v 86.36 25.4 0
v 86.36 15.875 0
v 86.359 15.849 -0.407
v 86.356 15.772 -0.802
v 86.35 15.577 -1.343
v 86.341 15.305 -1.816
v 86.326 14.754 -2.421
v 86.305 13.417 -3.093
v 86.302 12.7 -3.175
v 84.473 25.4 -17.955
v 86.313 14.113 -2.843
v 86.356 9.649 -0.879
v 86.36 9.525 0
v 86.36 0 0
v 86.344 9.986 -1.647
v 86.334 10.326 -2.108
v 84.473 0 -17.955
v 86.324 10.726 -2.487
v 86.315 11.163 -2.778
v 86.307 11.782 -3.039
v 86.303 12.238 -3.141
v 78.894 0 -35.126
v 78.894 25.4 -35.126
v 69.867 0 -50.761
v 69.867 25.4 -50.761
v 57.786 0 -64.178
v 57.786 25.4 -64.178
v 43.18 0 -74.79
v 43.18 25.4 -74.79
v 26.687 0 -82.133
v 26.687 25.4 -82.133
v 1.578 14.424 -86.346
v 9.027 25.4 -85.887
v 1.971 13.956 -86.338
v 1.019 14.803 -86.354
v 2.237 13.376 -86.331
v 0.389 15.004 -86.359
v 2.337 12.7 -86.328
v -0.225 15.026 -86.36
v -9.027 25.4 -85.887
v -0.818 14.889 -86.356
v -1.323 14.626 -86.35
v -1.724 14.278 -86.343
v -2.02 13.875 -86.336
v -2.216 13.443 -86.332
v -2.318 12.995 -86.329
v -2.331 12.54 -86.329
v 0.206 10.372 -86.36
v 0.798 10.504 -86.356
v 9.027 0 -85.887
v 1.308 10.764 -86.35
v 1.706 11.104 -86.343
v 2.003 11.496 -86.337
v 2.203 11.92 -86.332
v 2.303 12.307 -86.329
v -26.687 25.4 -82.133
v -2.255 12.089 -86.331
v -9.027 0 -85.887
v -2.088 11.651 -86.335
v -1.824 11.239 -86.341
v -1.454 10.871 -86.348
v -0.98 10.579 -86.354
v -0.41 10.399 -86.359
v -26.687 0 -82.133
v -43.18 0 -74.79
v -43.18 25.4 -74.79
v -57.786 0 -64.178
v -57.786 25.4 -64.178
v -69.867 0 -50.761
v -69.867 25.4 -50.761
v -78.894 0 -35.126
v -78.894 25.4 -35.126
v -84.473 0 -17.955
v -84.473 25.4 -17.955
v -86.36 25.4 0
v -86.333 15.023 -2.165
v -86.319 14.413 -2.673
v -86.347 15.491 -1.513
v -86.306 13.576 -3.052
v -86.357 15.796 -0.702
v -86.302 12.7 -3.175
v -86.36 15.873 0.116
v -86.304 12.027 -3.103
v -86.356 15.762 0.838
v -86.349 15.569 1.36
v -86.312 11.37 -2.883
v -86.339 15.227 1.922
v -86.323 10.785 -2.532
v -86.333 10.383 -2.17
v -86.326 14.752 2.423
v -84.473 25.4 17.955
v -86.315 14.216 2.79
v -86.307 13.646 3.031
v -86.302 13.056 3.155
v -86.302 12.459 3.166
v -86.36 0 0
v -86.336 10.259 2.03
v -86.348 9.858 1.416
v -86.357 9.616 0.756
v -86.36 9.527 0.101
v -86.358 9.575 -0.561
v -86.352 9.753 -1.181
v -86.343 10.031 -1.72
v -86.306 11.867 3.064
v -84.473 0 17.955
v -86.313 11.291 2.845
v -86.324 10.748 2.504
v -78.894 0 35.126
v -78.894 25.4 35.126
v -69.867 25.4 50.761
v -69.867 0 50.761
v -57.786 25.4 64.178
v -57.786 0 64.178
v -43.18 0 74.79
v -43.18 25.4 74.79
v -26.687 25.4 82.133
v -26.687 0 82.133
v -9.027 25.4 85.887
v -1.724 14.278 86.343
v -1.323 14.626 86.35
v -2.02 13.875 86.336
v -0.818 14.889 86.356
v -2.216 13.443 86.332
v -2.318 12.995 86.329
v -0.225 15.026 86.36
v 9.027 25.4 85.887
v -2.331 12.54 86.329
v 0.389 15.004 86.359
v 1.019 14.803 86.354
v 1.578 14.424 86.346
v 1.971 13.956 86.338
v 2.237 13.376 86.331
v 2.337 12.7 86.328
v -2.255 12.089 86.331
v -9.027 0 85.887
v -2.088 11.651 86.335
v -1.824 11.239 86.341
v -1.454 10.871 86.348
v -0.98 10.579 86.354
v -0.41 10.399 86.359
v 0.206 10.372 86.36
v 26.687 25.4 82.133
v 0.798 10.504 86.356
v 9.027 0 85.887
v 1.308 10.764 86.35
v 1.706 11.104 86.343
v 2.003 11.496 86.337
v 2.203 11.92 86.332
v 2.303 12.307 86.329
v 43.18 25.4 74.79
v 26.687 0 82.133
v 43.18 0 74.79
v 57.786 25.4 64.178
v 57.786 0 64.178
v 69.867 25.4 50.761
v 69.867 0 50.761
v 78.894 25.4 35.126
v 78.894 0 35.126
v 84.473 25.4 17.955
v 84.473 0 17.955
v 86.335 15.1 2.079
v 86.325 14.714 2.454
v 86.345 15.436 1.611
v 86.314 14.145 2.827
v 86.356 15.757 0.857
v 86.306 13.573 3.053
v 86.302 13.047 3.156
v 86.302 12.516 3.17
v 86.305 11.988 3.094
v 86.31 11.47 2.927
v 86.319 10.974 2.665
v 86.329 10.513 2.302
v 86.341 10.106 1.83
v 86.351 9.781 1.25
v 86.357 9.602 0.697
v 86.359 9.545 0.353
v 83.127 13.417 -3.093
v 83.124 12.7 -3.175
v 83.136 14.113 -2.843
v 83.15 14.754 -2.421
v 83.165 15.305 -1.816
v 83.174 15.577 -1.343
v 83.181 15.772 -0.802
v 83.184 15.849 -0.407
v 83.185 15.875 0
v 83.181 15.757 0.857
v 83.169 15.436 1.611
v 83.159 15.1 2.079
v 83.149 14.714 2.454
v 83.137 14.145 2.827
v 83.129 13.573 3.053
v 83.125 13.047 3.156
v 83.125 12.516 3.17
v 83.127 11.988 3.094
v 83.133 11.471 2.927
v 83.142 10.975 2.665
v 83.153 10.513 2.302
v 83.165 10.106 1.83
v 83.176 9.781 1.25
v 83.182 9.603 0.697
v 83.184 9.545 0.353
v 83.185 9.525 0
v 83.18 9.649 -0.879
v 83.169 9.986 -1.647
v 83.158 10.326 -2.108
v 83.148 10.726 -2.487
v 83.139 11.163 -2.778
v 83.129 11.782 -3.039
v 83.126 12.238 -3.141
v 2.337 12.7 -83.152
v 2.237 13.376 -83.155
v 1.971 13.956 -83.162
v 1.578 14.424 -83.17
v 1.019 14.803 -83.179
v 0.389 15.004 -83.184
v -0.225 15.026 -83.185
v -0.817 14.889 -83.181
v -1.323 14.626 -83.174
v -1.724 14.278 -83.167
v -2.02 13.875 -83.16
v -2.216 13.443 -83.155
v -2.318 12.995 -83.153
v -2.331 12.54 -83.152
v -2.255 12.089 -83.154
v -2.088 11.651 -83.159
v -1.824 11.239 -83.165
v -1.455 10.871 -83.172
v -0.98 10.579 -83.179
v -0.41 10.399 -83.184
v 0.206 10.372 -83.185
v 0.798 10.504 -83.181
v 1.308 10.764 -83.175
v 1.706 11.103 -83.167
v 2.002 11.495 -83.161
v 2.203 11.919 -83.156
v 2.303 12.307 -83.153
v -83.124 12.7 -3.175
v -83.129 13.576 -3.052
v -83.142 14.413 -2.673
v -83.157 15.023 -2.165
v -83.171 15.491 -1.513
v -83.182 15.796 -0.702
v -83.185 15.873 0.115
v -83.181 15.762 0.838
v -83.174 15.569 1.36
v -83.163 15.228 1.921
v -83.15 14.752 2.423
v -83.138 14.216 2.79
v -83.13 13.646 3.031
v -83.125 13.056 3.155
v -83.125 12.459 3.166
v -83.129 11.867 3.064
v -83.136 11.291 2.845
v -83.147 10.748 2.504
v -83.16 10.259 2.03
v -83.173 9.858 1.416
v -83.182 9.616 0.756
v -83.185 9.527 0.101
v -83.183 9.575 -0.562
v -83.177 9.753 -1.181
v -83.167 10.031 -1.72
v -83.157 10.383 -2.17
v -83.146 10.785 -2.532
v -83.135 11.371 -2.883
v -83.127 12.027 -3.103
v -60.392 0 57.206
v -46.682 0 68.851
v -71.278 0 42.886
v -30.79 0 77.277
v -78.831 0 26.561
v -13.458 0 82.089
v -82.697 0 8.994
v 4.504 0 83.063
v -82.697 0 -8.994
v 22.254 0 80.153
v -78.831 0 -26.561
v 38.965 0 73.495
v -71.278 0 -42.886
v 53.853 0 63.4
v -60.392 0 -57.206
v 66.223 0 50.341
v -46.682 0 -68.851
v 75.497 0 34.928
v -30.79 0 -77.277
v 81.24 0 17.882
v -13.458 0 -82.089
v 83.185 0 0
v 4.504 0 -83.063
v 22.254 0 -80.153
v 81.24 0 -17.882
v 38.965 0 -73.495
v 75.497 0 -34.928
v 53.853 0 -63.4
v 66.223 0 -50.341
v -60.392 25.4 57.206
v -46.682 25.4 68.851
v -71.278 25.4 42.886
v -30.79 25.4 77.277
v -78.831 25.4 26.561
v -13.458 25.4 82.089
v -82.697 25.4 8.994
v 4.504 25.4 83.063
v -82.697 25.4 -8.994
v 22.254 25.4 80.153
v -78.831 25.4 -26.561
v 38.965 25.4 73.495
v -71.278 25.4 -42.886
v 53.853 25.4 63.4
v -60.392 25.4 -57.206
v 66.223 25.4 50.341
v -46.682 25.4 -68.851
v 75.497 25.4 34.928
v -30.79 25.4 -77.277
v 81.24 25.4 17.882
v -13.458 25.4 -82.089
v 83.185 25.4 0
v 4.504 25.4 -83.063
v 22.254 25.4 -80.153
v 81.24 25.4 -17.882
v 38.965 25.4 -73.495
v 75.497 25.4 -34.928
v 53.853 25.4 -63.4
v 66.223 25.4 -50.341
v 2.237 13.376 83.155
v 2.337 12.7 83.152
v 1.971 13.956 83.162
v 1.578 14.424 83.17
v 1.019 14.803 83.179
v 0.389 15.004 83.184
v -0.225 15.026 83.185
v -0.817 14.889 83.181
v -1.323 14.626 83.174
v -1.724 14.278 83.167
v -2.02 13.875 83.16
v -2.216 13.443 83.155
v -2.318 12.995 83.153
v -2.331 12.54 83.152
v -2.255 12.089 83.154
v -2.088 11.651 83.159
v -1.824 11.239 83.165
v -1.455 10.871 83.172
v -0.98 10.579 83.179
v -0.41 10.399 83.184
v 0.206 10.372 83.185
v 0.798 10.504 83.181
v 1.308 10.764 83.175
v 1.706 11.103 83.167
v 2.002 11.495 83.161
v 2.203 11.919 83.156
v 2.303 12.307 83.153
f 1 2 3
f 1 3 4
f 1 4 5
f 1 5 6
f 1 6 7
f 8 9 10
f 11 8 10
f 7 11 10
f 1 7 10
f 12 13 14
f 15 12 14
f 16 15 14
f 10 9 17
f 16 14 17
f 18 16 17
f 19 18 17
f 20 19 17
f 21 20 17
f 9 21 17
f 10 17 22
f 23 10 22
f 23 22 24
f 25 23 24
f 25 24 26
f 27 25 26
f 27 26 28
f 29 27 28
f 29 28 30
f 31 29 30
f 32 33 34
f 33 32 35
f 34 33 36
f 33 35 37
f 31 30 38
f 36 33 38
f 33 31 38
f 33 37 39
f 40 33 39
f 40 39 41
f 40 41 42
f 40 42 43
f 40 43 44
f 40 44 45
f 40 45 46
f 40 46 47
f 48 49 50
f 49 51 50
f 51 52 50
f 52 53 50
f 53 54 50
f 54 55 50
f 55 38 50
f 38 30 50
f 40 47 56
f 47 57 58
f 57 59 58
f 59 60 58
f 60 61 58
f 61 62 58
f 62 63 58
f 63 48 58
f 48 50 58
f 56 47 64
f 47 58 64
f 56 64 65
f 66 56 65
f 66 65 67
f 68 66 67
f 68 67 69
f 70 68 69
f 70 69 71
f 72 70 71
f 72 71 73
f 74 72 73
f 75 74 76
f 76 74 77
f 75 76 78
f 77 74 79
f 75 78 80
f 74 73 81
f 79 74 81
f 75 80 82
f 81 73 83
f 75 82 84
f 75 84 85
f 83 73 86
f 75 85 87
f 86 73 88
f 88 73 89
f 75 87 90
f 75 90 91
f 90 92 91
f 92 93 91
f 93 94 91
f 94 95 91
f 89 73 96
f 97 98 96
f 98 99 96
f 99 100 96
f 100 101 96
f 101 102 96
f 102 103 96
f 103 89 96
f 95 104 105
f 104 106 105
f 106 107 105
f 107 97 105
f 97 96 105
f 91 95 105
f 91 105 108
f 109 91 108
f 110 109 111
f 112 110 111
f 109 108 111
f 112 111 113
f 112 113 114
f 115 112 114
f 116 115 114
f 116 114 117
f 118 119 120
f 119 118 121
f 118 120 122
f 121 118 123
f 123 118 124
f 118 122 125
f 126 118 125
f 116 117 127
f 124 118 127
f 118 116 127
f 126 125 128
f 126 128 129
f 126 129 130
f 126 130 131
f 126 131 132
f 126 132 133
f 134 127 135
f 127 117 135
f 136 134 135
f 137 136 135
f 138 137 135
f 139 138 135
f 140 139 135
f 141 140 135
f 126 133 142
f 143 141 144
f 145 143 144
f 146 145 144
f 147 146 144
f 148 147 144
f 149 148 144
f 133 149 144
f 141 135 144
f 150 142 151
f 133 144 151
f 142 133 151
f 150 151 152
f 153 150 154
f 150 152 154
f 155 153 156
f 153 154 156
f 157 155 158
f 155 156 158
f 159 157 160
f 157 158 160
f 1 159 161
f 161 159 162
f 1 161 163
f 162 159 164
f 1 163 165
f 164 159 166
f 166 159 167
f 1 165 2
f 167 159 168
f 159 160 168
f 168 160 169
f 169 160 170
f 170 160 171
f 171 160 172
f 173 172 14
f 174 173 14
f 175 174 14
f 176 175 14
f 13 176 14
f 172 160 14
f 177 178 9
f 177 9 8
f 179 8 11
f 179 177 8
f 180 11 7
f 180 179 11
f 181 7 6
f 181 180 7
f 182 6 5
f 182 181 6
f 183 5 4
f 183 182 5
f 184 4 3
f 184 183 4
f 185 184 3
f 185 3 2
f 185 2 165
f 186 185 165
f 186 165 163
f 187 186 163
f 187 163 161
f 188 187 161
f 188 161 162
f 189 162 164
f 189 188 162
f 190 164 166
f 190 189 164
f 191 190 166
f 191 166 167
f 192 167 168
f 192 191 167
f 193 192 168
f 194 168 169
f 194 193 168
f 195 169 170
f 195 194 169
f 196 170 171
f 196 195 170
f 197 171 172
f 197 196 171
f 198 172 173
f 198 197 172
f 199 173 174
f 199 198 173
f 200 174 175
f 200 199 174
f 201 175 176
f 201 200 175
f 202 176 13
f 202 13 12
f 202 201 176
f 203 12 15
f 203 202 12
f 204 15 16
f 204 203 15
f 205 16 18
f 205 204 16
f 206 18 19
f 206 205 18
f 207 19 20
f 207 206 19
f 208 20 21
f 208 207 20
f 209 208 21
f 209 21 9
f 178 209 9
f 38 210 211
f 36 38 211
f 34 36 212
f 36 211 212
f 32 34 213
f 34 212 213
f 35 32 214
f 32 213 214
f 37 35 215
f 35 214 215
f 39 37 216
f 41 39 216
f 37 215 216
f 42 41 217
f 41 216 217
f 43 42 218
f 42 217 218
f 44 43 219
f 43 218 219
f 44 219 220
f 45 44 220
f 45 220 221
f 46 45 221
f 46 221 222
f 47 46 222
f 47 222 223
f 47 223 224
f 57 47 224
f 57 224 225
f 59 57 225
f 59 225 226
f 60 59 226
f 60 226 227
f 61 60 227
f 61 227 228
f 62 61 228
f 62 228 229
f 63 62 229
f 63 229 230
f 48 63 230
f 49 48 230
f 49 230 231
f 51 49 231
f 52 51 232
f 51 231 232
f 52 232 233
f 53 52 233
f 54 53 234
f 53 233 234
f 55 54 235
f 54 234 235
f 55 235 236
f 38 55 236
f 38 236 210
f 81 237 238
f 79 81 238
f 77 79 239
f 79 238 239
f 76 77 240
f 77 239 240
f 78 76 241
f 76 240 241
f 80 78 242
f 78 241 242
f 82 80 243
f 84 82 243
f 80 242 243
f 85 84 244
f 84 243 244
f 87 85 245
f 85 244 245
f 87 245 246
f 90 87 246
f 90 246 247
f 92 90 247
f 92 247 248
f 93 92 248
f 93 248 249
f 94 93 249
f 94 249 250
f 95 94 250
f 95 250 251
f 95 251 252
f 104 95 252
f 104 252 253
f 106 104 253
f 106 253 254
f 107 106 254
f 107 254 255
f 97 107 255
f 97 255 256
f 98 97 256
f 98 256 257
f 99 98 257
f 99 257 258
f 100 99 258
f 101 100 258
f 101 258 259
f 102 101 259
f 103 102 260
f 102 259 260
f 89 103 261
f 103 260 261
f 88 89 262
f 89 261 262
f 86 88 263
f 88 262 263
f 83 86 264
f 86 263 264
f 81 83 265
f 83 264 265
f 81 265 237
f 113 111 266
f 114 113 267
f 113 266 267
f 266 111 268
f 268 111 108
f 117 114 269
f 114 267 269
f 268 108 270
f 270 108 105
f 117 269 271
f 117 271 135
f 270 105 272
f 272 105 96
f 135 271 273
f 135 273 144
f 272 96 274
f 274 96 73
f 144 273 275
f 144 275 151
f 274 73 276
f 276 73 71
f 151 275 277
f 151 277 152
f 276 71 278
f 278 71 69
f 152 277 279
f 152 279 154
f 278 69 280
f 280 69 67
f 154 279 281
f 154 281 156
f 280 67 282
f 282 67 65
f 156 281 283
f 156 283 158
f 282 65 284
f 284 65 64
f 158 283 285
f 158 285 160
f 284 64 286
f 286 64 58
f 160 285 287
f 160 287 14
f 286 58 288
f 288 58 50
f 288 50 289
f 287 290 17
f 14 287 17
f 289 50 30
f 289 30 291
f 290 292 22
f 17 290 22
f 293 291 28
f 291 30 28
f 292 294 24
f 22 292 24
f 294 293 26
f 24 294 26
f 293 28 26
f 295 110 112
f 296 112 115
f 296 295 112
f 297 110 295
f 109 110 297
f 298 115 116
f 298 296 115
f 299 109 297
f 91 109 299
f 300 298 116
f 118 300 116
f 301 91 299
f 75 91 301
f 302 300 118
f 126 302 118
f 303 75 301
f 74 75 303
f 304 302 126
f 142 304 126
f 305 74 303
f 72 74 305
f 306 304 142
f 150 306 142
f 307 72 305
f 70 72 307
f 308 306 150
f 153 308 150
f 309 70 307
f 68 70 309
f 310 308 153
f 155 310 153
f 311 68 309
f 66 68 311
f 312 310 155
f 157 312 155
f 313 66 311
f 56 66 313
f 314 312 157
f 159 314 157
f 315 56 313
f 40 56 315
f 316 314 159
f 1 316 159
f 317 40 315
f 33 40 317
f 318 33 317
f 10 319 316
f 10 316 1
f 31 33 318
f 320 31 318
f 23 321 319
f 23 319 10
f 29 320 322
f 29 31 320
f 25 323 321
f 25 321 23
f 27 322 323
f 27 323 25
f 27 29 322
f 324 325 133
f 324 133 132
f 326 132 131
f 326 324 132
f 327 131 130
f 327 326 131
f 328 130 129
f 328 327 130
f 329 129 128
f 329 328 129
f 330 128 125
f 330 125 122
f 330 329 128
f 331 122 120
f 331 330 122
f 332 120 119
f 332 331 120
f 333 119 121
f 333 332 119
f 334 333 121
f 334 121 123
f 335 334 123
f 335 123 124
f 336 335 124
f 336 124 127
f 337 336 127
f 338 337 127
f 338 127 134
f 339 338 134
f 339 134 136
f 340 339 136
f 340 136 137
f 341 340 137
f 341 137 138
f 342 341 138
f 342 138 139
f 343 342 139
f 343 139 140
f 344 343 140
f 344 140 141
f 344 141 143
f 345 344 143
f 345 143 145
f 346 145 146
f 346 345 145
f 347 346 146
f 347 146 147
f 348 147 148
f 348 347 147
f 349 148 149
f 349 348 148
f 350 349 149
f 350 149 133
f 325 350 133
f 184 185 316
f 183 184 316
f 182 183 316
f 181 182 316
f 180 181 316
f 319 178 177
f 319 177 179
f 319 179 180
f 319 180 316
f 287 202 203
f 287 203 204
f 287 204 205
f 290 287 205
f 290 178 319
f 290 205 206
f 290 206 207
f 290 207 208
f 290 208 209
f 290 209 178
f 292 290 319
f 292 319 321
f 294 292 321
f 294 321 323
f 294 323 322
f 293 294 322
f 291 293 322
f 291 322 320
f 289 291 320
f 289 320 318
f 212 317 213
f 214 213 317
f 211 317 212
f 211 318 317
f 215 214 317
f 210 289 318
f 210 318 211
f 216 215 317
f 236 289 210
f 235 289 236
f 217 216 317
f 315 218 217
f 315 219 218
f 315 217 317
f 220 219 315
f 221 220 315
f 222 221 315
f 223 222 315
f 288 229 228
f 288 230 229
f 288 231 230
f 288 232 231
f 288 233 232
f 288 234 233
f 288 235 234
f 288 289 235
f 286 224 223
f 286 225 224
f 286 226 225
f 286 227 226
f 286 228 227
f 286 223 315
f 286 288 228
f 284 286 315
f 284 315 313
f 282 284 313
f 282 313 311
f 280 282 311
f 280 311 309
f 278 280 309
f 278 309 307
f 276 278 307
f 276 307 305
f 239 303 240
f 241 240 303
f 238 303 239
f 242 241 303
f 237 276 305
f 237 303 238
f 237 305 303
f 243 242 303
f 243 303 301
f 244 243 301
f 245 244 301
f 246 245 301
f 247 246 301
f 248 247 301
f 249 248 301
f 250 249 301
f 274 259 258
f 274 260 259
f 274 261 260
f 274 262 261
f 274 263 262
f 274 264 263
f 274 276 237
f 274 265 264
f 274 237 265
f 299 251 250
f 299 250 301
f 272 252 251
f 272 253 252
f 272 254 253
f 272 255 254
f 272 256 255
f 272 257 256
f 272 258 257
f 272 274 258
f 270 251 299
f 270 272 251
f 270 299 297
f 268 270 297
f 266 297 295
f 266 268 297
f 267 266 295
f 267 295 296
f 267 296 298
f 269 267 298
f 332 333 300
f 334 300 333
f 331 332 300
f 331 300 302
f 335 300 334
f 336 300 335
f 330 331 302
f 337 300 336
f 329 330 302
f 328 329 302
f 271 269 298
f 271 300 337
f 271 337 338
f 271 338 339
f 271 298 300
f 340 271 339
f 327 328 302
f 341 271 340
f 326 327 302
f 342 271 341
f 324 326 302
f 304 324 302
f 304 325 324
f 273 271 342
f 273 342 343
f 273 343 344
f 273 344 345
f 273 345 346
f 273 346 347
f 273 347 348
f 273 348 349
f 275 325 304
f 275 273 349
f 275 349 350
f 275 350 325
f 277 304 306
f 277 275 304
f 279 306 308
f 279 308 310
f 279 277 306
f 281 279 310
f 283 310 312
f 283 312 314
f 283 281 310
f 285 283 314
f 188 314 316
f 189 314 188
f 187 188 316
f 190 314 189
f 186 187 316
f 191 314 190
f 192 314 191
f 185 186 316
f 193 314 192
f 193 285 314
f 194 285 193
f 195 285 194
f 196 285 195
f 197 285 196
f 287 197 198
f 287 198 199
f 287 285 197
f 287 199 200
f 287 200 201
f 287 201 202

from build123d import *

# Parameters (mm, degrees)
SKETCH1_R               = 86.36
SKETCH1_R_2             = 83.185
BOSS_EXTRUDE1_DEPTH     = 25.4
SKETCH2_R               = 3.175
CUT_EXTRUDE1_DEPTH      = 87.36
CUT_EXTRUDE1_DEPTH_BACK = 87.36
SKETCH3_R               = 2.3368
CUT_EXTRUDE2_DEPTH      = 87.3600001
CUT_EXTRUDE2_DEPTH_BACK = 87.3600001


with BuildPart() as part:
    # Sketch1 → Boss-Extrude1 (new body)
    with BuildSketch(Plane(origin=(0, 0, 0), x_dir=(1, 0, 0), z_dir=(0, 1, 0))):
        Circle(SKETCH1_R)
        Circle(SKETCH1_R_2, mode=Mode.SUBTRACT)
    extrude(amount=BOSS_EXTRUDE1_DEPTH)

    # Sketch2 → Cut-Extrude1 (cut, two sides)
    with BuildSketch(Plane(origin=(0, 0, 0), x_dir=(0, 0, -1), z_dir=(1, 0, 0))) as cut_extrude1_sk:
        with Locations((0, 12.7)):
            Circle(SKETCH2_R)
    extrude(amount=CUT_EXTRUDE1_DEPTH, mode=Mode.SUBTRACT)
    extrude(cut_extrude1_sk.sketch, amount=-CUT_EXTRUDE1_DEPTH_BACK, mode=Mode.SUBTRACT)

    # Sketch3 → Cut-Extrude2 (cut, two sides)
    with BuildSketch(Plane.XY) as cut_extrude2_sk:
        with Locations((0, 12.7)):
            Circle(SKETCH3_R)
    extrude(amount=CUT_EXTRUDE2_DEPTH, mode=Mode.SUBTRACT)
    extrude(cut_extrude2_sk.sketch, amount=-CUT_EXTRUDE2_DEPTH_BACK, mode=Mode.SUBTRACT)


solid = part.part
